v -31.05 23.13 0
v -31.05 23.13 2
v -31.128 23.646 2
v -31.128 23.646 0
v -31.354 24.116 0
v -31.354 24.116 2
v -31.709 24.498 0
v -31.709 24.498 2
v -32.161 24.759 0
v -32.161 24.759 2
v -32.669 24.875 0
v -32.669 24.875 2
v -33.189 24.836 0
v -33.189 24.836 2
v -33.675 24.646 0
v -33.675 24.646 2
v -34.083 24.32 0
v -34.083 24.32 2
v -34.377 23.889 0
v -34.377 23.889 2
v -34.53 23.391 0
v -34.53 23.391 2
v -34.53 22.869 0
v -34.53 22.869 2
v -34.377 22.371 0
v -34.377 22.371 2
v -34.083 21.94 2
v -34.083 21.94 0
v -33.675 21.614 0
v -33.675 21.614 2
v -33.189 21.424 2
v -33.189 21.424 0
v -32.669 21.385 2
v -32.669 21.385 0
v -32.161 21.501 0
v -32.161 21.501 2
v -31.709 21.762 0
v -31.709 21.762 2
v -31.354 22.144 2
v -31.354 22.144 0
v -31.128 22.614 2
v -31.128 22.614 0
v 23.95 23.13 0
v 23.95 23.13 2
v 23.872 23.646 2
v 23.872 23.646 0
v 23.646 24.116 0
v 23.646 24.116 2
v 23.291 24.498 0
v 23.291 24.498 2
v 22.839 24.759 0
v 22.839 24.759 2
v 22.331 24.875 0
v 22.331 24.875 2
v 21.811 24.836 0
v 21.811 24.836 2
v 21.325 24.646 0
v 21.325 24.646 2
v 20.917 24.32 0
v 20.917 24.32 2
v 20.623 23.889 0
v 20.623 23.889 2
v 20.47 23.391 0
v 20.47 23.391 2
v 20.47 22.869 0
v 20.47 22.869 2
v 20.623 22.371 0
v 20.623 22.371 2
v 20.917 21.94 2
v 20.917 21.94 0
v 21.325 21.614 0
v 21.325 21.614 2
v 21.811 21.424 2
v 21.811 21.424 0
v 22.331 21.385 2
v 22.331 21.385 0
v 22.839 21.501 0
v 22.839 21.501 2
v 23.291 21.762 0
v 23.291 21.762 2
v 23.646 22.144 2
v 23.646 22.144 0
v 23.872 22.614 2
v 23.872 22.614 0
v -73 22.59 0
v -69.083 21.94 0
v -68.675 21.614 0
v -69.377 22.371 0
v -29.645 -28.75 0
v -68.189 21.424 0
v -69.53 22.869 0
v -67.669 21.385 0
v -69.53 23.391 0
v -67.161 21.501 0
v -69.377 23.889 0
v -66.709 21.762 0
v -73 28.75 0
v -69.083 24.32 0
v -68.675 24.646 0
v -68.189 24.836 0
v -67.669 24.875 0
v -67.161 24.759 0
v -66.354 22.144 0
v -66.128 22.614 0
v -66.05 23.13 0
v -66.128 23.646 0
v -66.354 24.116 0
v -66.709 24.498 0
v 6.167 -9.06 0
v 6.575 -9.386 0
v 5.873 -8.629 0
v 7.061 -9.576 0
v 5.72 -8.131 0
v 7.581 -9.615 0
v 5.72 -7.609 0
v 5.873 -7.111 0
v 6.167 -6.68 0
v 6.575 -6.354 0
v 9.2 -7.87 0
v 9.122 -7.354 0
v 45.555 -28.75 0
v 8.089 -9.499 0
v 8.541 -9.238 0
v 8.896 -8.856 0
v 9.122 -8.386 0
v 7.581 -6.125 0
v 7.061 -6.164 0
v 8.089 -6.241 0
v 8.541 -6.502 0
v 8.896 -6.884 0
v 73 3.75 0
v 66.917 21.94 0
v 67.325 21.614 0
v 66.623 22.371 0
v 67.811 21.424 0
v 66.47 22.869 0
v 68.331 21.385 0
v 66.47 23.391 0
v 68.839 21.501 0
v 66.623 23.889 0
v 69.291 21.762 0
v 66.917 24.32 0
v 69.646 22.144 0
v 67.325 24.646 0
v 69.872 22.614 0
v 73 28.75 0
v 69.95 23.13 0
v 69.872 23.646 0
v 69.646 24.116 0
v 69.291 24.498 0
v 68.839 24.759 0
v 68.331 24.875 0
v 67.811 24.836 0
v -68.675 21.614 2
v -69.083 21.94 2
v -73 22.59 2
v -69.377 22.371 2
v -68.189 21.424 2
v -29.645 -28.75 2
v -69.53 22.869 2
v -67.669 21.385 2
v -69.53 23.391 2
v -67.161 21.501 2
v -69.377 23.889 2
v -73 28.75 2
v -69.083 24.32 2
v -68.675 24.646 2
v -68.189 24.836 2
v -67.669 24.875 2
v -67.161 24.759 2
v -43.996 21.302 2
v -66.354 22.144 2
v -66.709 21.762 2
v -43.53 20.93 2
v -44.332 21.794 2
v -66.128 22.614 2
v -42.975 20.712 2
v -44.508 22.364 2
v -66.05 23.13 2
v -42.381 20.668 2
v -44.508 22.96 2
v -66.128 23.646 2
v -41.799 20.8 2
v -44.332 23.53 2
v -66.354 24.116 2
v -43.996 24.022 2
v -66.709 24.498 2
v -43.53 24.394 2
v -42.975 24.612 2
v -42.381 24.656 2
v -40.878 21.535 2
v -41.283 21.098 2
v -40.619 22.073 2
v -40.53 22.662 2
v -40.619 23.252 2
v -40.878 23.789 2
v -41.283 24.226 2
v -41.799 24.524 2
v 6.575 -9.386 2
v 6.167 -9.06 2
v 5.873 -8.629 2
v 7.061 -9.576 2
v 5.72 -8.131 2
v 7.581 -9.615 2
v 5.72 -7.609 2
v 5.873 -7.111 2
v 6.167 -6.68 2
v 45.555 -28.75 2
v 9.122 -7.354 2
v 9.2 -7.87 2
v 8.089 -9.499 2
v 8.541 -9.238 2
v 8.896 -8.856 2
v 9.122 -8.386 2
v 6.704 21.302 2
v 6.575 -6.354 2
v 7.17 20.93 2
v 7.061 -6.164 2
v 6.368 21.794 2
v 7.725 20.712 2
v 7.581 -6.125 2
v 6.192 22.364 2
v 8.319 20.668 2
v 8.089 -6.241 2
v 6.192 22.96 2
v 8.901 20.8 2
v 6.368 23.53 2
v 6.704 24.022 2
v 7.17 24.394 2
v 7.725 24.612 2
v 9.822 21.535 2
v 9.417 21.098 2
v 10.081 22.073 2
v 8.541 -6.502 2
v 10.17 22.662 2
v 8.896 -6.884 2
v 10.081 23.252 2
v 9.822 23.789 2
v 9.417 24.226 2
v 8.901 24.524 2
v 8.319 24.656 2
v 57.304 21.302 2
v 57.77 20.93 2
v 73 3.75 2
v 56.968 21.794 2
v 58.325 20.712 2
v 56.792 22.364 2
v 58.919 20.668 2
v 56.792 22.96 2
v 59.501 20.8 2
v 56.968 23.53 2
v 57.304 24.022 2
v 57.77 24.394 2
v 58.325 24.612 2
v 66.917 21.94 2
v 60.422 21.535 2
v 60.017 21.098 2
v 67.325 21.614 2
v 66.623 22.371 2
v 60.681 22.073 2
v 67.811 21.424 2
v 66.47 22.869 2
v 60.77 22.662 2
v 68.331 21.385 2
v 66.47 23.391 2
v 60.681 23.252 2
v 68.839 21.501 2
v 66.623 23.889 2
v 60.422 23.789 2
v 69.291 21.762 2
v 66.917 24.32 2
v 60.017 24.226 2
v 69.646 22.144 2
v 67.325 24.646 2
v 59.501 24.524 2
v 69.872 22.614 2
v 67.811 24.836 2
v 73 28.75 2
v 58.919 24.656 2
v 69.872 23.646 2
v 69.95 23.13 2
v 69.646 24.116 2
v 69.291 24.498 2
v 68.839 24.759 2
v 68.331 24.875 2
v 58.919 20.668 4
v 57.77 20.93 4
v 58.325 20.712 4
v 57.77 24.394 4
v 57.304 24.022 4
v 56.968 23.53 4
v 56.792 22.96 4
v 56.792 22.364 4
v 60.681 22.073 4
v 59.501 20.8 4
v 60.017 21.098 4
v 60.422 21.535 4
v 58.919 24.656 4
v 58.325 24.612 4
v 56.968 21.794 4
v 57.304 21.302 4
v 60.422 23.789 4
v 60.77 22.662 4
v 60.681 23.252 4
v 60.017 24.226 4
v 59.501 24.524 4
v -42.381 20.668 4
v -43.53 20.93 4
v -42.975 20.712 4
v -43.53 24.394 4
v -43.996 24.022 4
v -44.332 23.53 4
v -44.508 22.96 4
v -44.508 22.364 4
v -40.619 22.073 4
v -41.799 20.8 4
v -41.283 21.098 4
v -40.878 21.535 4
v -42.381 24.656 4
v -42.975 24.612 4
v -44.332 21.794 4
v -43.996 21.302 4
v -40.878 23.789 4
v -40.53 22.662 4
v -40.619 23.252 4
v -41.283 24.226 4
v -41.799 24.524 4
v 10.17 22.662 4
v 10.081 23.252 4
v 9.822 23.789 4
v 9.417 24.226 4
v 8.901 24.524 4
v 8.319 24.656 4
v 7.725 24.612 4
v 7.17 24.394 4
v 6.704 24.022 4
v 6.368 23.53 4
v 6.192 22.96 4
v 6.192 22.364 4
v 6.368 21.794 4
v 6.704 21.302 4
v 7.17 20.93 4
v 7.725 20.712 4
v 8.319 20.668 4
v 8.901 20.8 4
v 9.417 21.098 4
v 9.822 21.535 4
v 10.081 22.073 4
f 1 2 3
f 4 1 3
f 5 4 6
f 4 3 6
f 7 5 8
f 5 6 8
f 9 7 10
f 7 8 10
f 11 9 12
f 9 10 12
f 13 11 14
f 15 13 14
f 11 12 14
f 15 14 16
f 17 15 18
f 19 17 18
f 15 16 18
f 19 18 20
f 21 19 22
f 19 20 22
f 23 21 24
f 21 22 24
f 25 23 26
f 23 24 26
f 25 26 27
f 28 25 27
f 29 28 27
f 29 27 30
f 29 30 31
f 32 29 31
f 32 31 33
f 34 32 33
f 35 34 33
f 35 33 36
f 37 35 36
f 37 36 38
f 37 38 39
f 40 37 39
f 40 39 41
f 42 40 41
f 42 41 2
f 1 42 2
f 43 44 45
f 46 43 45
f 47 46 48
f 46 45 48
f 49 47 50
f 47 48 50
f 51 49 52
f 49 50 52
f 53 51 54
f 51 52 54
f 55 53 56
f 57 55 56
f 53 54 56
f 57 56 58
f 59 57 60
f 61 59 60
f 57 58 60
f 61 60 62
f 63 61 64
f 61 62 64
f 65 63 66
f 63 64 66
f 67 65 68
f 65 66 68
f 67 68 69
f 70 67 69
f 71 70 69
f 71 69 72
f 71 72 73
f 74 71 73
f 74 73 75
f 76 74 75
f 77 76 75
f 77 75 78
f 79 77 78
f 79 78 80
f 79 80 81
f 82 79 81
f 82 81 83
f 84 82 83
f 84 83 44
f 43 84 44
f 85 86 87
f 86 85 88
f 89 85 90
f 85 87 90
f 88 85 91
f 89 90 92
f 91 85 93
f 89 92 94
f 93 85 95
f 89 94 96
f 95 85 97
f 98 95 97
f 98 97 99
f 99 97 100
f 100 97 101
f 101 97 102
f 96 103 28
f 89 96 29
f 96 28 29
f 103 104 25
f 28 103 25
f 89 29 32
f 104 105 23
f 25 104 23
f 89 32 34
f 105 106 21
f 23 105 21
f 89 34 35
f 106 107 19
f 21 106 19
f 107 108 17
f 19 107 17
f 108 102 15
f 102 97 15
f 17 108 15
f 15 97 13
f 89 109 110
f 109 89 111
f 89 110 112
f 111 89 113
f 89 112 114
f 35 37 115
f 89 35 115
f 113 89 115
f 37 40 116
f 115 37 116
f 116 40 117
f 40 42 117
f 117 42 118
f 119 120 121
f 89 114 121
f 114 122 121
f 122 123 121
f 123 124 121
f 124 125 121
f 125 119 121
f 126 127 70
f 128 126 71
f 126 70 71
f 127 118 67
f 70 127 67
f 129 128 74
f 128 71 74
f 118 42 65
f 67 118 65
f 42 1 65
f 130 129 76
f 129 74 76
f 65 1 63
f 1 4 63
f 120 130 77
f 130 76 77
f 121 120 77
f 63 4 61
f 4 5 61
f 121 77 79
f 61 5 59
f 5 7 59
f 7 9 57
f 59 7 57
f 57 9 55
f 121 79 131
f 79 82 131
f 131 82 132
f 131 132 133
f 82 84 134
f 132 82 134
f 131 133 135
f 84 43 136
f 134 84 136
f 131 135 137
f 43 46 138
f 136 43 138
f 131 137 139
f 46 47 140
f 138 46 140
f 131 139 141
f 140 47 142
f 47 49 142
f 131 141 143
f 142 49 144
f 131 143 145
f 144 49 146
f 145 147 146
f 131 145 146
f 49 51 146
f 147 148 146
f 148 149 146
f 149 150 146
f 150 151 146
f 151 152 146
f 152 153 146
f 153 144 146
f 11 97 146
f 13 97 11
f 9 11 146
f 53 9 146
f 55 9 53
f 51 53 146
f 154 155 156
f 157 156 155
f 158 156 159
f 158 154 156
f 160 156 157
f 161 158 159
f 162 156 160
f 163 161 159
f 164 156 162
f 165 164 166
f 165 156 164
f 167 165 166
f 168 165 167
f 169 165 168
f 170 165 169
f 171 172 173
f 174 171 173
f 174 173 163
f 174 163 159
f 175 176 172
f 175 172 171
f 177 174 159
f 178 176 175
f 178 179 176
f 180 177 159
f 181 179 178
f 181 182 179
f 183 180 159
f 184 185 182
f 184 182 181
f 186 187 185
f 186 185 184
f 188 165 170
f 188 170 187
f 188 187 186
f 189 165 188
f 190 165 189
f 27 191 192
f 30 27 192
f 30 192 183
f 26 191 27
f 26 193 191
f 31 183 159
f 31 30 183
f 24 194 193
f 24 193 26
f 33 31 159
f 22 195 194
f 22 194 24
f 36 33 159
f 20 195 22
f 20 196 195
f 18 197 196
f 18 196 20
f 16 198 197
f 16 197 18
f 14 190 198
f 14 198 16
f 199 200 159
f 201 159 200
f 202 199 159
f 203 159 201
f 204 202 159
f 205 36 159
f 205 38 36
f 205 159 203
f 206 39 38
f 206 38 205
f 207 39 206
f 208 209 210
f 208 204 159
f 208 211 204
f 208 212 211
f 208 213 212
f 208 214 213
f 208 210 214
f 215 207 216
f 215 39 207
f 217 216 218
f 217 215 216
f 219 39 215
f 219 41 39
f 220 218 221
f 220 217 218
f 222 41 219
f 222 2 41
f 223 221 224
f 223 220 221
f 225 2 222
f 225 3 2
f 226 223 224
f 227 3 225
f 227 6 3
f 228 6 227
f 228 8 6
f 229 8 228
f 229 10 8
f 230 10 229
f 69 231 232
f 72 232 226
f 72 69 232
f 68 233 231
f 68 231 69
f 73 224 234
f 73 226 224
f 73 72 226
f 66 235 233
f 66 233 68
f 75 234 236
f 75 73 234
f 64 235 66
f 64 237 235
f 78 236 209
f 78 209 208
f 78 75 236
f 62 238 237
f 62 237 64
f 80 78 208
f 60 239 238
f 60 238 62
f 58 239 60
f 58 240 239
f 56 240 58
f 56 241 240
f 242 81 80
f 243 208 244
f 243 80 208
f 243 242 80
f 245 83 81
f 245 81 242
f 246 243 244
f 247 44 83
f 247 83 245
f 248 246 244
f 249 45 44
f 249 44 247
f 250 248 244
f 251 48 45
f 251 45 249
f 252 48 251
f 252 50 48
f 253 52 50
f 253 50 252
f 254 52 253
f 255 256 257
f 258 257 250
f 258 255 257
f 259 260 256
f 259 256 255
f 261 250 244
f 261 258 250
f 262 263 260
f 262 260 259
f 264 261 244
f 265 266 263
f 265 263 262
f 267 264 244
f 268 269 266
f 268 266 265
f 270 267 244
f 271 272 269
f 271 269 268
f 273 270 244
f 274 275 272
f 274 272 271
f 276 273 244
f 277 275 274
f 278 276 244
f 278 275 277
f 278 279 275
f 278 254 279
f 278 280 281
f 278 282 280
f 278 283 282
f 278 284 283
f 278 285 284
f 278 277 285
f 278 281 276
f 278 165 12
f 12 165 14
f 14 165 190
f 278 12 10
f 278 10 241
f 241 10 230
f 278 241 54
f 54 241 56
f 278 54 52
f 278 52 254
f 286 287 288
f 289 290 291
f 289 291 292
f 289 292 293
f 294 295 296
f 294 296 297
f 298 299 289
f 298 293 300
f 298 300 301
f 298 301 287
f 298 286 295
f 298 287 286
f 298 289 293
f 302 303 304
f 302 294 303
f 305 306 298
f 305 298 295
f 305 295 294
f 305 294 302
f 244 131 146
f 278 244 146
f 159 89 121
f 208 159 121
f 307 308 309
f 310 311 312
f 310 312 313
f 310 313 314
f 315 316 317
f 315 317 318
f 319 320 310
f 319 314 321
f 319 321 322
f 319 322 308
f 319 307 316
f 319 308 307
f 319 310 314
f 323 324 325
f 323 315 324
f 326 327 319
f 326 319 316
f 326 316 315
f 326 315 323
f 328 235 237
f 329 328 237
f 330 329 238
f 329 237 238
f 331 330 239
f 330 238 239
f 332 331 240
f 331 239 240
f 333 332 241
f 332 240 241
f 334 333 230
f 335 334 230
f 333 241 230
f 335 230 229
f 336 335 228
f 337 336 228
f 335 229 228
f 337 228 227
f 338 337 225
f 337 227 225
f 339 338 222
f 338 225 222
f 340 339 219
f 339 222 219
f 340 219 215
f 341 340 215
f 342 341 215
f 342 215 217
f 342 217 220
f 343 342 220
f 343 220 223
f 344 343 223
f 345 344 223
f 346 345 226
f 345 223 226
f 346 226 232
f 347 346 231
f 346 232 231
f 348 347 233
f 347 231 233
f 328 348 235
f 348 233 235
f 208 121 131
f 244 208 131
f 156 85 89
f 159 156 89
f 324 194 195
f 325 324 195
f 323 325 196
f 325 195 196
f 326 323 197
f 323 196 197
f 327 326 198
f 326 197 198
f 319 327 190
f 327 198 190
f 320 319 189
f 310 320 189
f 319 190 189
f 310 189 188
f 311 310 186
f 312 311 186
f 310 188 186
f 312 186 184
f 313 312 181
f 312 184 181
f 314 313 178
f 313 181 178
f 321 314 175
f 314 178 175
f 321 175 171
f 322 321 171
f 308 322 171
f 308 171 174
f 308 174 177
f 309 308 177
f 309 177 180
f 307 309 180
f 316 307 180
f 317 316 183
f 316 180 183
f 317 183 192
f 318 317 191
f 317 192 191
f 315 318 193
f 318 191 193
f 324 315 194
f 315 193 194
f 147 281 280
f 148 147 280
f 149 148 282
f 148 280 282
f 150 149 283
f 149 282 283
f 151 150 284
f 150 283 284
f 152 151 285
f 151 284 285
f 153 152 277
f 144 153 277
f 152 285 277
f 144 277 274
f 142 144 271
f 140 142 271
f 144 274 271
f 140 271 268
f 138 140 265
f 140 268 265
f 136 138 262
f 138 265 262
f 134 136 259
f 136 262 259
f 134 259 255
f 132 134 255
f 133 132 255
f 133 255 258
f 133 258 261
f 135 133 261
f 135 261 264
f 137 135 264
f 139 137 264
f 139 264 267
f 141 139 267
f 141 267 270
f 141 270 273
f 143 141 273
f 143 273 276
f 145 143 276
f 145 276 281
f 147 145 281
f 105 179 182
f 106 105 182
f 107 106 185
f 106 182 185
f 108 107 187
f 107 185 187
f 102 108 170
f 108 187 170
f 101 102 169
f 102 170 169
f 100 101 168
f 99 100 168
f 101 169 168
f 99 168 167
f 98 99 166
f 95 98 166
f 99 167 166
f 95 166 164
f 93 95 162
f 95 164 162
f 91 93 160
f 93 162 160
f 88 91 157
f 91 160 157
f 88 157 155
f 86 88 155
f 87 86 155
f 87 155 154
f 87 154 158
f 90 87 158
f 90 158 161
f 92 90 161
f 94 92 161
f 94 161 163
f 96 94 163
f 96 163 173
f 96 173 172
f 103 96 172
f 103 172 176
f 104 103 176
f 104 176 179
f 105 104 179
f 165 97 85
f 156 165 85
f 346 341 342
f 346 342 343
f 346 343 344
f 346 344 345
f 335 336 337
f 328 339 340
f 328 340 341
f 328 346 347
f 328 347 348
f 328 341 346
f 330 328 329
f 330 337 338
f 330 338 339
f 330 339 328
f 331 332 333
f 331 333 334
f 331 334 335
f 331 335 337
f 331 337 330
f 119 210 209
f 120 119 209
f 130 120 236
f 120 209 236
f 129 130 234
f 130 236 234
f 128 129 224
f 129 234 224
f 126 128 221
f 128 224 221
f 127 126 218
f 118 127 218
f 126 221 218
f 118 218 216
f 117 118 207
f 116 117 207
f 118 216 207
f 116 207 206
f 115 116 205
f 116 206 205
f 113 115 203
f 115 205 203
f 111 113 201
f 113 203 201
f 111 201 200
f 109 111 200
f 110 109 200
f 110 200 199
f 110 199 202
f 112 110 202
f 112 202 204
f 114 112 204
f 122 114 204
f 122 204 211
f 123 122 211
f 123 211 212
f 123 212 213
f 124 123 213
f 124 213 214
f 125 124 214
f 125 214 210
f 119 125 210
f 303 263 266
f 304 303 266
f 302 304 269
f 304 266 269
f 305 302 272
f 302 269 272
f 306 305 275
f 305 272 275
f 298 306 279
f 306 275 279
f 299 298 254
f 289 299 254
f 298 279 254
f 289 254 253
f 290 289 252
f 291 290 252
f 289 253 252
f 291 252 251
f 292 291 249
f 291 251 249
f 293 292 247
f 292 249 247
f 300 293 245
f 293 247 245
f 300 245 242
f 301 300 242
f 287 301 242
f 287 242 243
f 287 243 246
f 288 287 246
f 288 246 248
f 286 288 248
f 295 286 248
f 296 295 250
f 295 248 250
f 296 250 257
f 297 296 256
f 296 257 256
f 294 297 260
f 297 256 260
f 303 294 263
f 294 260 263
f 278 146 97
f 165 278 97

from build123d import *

# Parameters (mm, degrees)
RESSALTO_EXTRUS_O1_DEPTH = 2
CORTE_EXTRUS_O1_REACH    = 4
ESBO_O2_R                = 1.75
ESBO_O3_R                = 2
RESSALTO_EXTRUS_O2_DEPTH = 2


with BuildPart() as part:
    # Esboço1 → Ressalto-extrusão1 (new body)
    with BuildSketch(Plane.XY):
        Polygon((-73, 22.58983114), (-29.645188864, -28.75), (45.554811136, -28.75), (73, 3.75), (73, 28.75), (-73, 28.75), align=None)
    extrude(amount=RESSALTO_EXTRUS_O1_DEPTH)

    # Esboço2 → Corte-extrusão1 (cut, up to next)
    with BuildSketch(Plane.XY.offset(2), mode=Mode.PRIVATE) as corte_extrus_o1_sk1:
        with Locations((22.2, 23.13)):
            Circle(ESBO_O2_R)
    corte_extrus_o1_tool1 = extrude(corte_extrus_o1_sk1.sketch, amount=-CORTE_EXTRUS_O1_REACH, mode=Mode.PRIVATE) & part.part
    add(corte_extrus_o1_tool1.solids().sort_by_distance((22.2, 23.13, 2))[0], mode=Mode.SUBTRACT)
    # Esboço2 → Corte-extrusão1 (cut, up to next)
    with BuildSketch(Plane.XY.offset(2), mode=Mode.PRIVATE) as corte_extrus_o1_sk2:
        with Locations((68.2, 23.13)):
            Circle(ESBO_O2_R)
    corte_extrus_o1_tool2 = extrude(corte_extrus_o1_sk2.sketch, amount=-CORTE_EXTRUS_O1_REACH, mode=Mode.PRIVATE) & part.part
    add(corte_extrus_o1_tool2.solids().sort_by_distance((68.2, 23.13, 2))[0], mode=Mode.SUBTRACT)
    # Esboço2 → Corte-extrusão1 (cut, up to next)
    with BuildSketch(Plane.XY.offset(2), mode=Mode.PRIVATE) as corte_extrus_o1_sk3:
        with Locations((-32.8, 23.13)):
            Circle(ESBO_O2_R)
    corte_extrus_o1_tool3 = extrude(corte_extrus_o1_sk3.sketch, amount=-CORTE_EXTRUS_O1_REACH, mode=Mode.PRIVATE) & part.part
    add(corte_extrus_o1_tool3.solids().sort_by_distance((-32.8, 23.13, 2))[0], mode=Mode.SUBTRACT)
    # Esboço2 → Corte-extrusão1 (cut, up to next)
    with BuildSketch(Plane.XY.offset(2), mode=Mode.PRIVATE) as corte_extrus_o1_sk4:
        with Locations((-67.8, 23.13)):
            Circle(ESBO_O2_R)
    corte_extrus_o1_tool4 = extrude(corte_extrus_o1_sk4.sketch, amount=-CORTE_EXTRUS_O1_REACH, mode=Mode.PRIVATE) & part.part
    add(corte_extrus_o1_tool4.solids().sort_by_distance((-67.8, 23.13, 2))[0], mode=Mode.SUBTRACT)
    # Esboço2 → Corte-extrusão1 (cut, up to next)
    with BuildSketch(Plane.XY.offset(2), mode=Mode.PRIVATE) as corte_extrus_o1_sk5:
        with Locations((7.45, -7.87)):
            Circle(ESBO_O2_R)
    corte_extrus_o1_tool5 = extrude(corte_extrus_o1_sk5.sketch, amount=-CORTE_EXTRUS_O1_REACH, mode=Mode.PRIVATE) & part.part
    add(corte_extrus_o1_tool5.solids().sort_by_distance((7.45, -7.87, 2))[0], mode=Mode.SUBTRACT)

    # Esboço3 → Ressalto-extrusão2 (add)
    with BuildSketch(Plane.XY.offset(2)):
        with Locations((8.17, 22.662028239)):
            Circle(ESBO_O3_R)
        with Locations((58.77, 22.662028239)):
            Circle(ESBO_O3_R)
        with Locations((-42.53, 22.662028239)):
            Circle(ESBO_O3_R)
    extrude(amount=RESSALTO_EXTRUS_O2_DEPTH)


solid = part.part
